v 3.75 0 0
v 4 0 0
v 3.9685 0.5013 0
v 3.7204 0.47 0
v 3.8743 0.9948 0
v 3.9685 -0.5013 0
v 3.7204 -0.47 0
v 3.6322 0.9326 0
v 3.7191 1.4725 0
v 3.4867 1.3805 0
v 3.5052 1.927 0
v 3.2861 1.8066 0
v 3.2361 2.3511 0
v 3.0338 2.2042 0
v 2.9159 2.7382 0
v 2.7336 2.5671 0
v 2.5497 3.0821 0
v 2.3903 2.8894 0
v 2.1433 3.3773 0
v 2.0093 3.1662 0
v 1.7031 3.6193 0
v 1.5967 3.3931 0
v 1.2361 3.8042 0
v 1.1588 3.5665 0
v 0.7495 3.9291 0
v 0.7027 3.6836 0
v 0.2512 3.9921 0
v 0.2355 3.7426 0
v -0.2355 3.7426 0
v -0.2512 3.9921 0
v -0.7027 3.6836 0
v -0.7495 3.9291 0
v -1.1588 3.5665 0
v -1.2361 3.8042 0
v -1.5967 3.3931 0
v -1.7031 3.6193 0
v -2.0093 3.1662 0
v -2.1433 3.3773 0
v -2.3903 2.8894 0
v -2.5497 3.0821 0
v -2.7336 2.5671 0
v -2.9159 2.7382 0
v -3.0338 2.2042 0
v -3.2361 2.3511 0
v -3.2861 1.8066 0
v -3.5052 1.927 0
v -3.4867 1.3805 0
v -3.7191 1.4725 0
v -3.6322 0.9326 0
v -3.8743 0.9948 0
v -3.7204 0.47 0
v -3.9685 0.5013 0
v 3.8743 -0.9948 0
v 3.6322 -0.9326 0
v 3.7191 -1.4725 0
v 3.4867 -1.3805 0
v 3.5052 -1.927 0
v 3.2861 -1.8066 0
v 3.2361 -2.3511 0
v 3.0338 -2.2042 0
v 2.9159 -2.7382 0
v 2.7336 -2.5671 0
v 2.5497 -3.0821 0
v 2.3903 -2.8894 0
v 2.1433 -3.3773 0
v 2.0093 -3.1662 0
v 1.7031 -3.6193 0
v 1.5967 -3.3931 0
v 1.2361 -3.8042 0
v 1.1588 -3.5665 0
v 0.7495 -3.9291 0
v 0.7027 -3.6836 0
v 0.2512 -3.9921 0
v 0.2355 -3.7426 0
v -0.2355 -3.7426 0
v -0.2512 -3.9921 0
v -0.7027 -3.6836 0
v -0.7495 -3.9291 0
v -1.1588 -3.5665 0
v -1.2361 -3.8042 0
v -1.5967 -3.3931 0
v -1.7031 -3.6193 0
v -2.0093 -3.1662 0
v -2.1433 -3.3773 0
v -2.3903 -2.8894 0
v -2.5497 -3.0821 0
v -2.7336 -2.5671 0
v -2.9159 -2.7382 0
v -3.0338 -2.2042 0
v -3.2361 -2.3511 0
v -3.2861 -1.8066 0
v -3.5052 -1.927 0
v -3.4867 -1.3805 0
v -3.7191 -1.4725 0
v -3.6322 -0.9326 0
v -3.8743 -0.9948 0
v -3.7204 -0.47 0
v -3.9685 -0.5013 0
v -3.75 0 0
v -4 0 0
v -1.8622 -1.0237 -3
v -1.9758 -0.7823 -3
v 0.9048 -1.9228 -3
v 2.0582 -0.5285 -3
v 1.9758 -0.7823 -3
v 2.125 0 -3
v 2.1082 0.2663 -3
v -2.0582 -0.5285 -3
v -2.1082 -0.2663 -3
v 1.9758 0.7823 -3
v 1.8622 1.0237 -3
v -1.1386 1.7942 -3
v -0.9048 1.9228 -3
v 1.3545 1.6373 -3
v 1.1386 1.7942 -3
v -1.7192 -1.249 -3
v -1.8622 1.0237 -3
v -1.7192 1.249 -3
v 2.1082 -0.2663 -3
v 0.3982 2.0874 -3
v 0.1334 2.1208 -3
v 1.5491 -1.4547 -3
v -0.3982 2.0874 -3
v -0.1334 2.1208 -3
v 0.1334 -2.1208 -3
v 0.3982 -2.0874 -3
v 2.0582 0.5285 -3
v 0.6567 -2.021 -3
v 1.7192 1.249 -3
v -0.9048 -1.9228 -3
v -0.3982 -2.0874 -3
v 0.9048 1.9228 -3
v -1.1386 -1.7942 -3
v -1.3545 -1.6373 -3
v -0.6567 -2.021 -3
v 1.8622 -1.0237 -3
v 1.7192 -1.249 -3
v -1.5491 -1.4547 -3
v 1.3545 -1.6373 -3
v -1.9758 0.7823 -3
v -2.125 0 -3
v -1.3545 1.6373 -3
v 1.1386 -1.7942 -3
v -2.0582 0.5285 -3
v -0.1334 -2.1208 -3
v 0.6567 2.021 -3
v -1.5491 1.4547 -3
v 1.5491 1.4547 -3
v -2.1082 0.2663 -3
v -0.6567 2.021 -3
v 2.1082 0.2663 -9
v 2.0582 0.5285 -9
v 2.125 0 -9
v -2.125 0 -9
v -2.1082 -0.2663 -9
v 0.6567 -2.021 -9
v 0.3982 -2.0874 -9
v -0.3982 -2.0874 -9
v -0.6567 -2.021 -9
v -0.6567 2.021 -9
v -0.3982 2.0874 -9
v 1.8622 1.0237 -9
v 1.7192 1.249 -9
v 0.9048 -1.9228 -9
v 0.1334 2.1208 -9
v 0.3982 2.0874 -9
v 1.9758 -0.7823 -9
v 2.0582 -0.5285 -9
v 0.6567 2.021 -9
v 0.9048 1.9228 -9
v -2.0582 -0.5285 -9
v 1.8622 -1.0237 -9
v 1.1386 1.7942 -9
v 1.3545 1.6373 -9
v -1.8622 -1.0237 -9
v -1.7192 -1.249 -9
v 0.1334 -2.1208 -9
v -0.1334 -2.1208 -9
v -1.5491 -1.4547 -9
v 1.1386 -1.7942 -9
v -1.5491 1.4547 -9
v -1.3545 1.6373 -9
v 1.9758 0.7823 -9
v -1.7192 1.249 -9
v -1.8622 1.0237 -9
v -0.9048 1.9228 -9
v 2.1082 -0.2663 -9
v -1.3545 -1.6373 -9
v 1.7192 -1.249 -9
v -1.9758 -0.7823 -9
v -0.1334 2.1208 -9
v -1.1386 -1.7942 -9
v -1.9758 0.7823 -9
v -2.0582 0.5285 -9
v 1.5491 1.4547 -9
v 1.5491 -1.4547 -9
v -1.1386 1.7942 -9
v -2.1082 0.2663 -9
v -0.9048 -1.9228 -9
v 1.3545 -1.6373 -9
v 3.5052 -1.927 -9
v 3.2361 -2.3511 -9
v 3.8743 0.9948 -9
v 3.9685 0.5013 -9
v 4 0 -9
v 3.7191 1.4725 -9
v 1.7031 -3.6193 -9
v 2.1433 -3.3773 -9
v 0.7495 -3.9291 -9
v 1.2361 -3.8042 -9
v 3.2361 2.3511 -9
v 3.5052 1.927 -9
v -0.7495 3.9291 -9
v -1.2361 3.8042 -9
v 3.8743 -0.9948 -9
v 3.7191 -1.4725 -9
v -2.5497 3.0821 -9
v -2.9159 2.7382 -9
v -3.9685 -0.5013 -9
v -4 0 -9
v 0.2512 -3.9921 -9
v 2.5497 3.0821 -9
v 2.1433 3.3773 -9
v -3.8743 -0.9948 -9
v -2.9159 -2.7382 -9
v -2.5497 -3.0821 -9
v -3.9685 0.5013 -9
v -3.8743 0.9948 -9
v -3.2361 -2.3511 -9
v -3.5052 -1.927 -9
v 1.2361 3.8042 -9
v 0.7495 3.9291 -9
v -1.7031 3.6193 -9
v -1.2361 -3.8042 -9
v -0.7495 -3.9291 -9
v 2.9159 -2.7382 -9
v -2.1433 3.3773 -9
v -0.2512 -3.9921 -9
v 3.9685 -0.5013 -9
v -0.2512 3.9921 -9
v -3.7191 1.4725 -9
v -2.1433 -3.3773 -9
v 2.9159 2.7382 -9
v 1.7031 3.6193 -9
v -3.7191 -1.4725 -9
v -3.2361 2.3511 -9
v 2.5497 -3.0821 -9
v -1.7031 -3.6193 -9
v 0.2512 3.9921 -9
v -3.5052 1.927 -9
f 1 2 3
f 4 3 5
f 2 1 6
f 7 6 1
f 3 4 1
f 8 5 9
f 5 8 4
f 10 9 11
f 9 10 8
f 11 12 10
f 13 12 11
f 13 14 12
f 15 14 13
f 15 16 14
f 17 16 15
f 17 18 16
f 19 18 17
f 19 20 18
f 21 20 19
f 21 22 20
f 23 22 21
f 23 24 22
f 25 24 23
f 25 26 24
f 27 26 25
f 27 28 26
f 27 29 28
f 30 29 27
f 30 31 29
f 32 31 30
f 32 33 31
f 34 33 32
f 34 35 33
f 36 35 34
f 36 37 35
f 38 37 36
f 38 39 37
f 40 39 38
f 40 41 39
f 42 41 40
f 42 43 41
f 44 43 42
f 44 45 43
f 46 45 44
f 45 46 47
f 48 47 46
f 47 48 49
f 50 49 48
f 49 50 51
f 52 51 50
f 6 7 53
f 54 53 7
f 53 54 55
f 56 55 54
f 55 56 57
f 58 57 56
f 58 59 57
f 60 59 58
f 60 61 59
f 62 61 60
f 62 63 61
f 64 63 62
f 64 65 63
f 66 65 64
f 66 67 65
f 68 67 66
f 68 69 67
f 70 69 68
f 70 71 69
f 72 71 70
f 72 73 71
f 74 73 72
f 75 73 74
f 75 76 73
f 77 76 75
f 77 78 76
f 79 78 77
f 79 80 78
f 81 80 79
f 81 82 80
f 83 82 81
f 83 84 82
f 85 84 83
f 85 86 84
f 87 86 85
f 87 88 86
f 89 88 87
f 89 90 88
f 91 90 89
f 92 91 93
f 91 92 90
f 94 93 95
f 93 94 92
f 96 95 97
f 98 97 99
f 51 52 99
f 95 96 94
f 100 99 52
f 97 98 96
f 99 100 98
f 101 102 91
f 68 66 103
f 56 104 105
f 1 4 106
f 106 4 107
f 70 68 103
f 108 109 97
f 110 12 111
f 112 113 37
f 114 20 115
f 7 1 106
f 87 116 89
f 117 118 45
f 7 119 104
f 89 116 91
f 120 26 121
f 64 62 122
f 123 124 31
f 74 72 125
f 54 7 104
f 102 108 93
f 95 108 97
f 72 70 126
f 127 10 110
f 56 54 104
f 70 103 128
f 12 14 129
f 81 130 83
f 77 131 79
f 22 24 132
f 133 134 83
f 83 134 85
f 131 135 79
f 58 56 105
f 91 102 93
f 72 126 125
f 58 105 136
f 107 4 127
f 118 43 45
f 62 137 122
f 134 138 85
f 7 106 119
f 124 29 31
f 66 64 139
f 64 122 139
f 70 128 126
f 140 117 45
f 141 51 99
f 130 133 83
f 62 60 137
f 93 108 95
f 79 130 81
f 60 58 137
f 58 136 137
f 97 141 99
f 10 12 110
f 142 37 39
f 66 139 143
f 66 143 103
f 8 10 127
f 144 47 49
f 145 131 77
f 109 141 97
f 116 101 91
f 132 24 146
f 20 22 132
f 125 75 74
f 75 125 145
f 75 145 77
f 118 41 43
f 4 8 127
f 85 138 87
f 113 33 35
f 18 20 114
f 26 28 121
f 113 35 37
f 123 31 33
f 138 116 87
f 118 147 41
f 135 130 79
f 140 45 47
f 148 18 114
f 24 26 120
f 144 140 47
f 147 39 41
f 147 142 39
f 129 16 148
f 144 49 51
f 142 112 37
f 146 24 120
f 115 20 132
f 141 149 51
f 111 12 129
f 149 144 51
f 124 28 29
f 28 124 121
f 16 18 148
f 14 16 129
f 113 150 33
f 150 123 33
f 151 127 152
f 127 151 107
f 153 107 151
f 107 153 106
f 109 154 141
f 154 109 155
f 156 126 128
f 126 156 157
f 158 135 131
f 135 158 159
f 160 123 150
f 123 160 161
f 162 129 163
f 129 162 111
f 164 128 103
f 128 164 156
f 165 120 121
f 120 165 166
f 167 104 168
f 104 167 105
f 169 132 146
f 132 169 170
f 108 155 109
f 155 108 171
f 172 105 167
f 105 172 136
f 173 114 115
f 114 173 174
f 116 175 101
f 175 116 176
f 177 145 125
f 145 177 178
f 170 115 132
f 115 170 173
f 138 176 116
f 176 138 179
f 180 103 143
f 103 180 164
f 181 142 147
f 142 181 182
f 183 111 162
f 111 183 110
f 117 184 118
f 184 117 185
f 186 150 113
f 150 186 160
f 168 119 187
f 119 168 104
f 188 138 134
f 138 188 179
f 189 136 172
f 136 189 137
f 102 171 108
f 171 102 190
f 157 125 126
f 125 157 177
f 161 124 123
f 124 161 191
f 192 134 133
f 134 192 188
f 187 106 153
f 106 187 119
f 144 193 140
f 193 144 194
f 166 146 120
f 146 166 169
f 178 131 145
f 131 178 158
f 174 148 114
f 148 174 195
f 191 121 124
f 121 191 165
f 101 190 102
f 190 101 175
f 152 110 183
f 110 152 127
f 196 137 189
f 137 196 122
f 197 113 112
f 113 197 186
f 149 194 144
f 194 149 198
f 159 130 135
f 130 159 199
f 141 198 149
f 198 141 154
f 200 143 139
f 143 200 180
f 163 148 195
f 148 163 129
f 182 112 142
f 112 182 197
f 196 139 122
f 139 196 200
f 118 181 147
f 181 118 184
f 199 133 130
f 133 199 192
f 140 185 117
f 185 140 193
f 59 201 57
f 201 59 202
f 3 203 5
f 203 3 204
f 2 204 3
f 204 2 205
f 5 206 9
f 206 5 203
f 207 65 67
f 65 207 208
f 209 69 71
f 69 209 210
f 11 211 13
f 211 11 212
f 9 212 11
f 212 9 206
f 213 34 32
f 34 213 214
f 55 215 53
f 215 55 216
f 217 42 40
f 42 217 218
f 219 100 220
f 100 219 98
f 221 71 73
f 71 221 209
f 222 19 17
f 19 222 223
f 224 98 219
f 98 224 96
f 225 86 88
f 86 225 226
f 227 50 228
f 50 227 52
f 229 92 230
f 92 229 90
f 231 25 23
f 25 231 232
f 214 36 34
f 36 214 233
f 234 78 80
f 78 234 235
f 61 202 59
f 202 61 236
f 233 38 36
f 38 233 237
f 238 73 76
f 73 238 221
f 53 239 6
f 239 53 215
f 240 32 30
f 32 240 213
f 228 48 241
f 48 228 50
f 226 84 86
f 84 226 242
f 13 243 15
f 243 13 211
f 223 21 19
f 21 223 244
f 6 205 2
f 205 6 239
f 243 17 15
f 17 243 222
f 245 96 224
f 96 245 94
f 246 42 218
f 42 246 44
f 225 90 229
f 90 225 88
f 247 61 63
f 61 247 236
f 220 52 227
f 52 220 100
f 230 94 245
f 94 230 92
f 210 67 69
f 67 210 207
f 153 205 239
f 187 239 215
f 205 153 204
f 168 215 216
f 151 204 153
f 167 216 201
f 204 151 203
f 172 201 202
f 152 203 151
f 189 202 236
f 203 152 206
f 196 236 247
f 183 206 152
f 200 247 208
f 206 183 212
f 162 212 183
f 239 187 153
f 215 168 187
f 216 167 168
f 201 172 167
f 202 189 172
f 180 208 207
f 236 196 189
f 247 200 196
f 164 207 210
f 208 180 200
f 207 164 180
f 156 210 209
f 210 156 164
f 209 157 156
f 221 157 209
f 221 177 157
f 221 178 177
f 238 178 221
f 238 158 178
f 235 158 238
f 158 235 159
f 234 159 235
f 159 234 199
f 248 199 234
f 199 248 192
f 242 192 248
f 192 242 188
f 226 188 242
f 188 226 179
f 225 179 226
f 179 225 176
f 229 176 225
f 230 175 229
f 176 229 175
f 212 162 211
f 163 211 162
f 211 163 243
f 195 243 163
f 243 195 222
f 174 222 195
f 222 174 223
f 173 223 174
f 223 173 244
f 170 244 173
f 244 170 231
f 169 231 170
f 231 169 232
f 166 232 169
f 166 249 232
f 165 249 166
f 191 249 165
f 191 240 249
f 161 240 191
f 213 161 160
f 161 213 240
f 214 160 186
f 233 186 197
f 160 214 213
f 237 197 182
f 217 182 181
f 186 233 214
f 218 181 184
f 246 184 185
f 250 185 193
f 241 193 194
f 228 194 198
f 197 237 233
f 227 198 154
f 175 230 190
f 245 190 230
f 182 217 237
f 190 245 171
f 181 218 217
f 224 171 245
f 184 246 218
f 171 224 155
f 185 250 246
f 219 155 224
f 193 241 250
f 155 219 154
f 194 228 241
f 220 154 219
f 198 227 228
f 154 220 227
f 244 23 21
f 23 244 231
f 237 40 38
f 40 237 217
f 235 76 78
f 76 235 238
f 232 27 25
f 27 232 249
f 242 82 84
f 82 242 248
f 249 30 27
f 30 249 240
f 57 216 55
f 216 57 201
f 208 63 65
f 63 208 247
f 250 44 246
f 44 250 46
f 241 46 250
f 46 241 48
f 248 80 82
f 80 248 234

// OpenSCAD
$fn = 50;

difference() {
	union() {
		translate(v = [0, 0, -9.0]) {
			cylinder(h = 9, r = 4.0);
		}
	}
	union() {
		translate(v = [0, 0, 0]) {
			rotate(a = [0, 0, 0]) {
				difference() {
					union() {
						translate(v = [0, 0, -12.0]) {
							cylinder(h = 12, r = 2.0);
						}
						translate(v = [0, 0, -3]) {
							cylinder(h = 3, r1 = 2.125, r2 = 3.75);
						}
						translate(v = [0, 0, -12.0]) {
							cylinder(h = 12, r = 2.125);
						}
						translate(v = [0, 0, -12.0]) {
							cylinder(h = 12, r = 2.0);
						}
					}
					union();
				}
			}
		}
	}
}
